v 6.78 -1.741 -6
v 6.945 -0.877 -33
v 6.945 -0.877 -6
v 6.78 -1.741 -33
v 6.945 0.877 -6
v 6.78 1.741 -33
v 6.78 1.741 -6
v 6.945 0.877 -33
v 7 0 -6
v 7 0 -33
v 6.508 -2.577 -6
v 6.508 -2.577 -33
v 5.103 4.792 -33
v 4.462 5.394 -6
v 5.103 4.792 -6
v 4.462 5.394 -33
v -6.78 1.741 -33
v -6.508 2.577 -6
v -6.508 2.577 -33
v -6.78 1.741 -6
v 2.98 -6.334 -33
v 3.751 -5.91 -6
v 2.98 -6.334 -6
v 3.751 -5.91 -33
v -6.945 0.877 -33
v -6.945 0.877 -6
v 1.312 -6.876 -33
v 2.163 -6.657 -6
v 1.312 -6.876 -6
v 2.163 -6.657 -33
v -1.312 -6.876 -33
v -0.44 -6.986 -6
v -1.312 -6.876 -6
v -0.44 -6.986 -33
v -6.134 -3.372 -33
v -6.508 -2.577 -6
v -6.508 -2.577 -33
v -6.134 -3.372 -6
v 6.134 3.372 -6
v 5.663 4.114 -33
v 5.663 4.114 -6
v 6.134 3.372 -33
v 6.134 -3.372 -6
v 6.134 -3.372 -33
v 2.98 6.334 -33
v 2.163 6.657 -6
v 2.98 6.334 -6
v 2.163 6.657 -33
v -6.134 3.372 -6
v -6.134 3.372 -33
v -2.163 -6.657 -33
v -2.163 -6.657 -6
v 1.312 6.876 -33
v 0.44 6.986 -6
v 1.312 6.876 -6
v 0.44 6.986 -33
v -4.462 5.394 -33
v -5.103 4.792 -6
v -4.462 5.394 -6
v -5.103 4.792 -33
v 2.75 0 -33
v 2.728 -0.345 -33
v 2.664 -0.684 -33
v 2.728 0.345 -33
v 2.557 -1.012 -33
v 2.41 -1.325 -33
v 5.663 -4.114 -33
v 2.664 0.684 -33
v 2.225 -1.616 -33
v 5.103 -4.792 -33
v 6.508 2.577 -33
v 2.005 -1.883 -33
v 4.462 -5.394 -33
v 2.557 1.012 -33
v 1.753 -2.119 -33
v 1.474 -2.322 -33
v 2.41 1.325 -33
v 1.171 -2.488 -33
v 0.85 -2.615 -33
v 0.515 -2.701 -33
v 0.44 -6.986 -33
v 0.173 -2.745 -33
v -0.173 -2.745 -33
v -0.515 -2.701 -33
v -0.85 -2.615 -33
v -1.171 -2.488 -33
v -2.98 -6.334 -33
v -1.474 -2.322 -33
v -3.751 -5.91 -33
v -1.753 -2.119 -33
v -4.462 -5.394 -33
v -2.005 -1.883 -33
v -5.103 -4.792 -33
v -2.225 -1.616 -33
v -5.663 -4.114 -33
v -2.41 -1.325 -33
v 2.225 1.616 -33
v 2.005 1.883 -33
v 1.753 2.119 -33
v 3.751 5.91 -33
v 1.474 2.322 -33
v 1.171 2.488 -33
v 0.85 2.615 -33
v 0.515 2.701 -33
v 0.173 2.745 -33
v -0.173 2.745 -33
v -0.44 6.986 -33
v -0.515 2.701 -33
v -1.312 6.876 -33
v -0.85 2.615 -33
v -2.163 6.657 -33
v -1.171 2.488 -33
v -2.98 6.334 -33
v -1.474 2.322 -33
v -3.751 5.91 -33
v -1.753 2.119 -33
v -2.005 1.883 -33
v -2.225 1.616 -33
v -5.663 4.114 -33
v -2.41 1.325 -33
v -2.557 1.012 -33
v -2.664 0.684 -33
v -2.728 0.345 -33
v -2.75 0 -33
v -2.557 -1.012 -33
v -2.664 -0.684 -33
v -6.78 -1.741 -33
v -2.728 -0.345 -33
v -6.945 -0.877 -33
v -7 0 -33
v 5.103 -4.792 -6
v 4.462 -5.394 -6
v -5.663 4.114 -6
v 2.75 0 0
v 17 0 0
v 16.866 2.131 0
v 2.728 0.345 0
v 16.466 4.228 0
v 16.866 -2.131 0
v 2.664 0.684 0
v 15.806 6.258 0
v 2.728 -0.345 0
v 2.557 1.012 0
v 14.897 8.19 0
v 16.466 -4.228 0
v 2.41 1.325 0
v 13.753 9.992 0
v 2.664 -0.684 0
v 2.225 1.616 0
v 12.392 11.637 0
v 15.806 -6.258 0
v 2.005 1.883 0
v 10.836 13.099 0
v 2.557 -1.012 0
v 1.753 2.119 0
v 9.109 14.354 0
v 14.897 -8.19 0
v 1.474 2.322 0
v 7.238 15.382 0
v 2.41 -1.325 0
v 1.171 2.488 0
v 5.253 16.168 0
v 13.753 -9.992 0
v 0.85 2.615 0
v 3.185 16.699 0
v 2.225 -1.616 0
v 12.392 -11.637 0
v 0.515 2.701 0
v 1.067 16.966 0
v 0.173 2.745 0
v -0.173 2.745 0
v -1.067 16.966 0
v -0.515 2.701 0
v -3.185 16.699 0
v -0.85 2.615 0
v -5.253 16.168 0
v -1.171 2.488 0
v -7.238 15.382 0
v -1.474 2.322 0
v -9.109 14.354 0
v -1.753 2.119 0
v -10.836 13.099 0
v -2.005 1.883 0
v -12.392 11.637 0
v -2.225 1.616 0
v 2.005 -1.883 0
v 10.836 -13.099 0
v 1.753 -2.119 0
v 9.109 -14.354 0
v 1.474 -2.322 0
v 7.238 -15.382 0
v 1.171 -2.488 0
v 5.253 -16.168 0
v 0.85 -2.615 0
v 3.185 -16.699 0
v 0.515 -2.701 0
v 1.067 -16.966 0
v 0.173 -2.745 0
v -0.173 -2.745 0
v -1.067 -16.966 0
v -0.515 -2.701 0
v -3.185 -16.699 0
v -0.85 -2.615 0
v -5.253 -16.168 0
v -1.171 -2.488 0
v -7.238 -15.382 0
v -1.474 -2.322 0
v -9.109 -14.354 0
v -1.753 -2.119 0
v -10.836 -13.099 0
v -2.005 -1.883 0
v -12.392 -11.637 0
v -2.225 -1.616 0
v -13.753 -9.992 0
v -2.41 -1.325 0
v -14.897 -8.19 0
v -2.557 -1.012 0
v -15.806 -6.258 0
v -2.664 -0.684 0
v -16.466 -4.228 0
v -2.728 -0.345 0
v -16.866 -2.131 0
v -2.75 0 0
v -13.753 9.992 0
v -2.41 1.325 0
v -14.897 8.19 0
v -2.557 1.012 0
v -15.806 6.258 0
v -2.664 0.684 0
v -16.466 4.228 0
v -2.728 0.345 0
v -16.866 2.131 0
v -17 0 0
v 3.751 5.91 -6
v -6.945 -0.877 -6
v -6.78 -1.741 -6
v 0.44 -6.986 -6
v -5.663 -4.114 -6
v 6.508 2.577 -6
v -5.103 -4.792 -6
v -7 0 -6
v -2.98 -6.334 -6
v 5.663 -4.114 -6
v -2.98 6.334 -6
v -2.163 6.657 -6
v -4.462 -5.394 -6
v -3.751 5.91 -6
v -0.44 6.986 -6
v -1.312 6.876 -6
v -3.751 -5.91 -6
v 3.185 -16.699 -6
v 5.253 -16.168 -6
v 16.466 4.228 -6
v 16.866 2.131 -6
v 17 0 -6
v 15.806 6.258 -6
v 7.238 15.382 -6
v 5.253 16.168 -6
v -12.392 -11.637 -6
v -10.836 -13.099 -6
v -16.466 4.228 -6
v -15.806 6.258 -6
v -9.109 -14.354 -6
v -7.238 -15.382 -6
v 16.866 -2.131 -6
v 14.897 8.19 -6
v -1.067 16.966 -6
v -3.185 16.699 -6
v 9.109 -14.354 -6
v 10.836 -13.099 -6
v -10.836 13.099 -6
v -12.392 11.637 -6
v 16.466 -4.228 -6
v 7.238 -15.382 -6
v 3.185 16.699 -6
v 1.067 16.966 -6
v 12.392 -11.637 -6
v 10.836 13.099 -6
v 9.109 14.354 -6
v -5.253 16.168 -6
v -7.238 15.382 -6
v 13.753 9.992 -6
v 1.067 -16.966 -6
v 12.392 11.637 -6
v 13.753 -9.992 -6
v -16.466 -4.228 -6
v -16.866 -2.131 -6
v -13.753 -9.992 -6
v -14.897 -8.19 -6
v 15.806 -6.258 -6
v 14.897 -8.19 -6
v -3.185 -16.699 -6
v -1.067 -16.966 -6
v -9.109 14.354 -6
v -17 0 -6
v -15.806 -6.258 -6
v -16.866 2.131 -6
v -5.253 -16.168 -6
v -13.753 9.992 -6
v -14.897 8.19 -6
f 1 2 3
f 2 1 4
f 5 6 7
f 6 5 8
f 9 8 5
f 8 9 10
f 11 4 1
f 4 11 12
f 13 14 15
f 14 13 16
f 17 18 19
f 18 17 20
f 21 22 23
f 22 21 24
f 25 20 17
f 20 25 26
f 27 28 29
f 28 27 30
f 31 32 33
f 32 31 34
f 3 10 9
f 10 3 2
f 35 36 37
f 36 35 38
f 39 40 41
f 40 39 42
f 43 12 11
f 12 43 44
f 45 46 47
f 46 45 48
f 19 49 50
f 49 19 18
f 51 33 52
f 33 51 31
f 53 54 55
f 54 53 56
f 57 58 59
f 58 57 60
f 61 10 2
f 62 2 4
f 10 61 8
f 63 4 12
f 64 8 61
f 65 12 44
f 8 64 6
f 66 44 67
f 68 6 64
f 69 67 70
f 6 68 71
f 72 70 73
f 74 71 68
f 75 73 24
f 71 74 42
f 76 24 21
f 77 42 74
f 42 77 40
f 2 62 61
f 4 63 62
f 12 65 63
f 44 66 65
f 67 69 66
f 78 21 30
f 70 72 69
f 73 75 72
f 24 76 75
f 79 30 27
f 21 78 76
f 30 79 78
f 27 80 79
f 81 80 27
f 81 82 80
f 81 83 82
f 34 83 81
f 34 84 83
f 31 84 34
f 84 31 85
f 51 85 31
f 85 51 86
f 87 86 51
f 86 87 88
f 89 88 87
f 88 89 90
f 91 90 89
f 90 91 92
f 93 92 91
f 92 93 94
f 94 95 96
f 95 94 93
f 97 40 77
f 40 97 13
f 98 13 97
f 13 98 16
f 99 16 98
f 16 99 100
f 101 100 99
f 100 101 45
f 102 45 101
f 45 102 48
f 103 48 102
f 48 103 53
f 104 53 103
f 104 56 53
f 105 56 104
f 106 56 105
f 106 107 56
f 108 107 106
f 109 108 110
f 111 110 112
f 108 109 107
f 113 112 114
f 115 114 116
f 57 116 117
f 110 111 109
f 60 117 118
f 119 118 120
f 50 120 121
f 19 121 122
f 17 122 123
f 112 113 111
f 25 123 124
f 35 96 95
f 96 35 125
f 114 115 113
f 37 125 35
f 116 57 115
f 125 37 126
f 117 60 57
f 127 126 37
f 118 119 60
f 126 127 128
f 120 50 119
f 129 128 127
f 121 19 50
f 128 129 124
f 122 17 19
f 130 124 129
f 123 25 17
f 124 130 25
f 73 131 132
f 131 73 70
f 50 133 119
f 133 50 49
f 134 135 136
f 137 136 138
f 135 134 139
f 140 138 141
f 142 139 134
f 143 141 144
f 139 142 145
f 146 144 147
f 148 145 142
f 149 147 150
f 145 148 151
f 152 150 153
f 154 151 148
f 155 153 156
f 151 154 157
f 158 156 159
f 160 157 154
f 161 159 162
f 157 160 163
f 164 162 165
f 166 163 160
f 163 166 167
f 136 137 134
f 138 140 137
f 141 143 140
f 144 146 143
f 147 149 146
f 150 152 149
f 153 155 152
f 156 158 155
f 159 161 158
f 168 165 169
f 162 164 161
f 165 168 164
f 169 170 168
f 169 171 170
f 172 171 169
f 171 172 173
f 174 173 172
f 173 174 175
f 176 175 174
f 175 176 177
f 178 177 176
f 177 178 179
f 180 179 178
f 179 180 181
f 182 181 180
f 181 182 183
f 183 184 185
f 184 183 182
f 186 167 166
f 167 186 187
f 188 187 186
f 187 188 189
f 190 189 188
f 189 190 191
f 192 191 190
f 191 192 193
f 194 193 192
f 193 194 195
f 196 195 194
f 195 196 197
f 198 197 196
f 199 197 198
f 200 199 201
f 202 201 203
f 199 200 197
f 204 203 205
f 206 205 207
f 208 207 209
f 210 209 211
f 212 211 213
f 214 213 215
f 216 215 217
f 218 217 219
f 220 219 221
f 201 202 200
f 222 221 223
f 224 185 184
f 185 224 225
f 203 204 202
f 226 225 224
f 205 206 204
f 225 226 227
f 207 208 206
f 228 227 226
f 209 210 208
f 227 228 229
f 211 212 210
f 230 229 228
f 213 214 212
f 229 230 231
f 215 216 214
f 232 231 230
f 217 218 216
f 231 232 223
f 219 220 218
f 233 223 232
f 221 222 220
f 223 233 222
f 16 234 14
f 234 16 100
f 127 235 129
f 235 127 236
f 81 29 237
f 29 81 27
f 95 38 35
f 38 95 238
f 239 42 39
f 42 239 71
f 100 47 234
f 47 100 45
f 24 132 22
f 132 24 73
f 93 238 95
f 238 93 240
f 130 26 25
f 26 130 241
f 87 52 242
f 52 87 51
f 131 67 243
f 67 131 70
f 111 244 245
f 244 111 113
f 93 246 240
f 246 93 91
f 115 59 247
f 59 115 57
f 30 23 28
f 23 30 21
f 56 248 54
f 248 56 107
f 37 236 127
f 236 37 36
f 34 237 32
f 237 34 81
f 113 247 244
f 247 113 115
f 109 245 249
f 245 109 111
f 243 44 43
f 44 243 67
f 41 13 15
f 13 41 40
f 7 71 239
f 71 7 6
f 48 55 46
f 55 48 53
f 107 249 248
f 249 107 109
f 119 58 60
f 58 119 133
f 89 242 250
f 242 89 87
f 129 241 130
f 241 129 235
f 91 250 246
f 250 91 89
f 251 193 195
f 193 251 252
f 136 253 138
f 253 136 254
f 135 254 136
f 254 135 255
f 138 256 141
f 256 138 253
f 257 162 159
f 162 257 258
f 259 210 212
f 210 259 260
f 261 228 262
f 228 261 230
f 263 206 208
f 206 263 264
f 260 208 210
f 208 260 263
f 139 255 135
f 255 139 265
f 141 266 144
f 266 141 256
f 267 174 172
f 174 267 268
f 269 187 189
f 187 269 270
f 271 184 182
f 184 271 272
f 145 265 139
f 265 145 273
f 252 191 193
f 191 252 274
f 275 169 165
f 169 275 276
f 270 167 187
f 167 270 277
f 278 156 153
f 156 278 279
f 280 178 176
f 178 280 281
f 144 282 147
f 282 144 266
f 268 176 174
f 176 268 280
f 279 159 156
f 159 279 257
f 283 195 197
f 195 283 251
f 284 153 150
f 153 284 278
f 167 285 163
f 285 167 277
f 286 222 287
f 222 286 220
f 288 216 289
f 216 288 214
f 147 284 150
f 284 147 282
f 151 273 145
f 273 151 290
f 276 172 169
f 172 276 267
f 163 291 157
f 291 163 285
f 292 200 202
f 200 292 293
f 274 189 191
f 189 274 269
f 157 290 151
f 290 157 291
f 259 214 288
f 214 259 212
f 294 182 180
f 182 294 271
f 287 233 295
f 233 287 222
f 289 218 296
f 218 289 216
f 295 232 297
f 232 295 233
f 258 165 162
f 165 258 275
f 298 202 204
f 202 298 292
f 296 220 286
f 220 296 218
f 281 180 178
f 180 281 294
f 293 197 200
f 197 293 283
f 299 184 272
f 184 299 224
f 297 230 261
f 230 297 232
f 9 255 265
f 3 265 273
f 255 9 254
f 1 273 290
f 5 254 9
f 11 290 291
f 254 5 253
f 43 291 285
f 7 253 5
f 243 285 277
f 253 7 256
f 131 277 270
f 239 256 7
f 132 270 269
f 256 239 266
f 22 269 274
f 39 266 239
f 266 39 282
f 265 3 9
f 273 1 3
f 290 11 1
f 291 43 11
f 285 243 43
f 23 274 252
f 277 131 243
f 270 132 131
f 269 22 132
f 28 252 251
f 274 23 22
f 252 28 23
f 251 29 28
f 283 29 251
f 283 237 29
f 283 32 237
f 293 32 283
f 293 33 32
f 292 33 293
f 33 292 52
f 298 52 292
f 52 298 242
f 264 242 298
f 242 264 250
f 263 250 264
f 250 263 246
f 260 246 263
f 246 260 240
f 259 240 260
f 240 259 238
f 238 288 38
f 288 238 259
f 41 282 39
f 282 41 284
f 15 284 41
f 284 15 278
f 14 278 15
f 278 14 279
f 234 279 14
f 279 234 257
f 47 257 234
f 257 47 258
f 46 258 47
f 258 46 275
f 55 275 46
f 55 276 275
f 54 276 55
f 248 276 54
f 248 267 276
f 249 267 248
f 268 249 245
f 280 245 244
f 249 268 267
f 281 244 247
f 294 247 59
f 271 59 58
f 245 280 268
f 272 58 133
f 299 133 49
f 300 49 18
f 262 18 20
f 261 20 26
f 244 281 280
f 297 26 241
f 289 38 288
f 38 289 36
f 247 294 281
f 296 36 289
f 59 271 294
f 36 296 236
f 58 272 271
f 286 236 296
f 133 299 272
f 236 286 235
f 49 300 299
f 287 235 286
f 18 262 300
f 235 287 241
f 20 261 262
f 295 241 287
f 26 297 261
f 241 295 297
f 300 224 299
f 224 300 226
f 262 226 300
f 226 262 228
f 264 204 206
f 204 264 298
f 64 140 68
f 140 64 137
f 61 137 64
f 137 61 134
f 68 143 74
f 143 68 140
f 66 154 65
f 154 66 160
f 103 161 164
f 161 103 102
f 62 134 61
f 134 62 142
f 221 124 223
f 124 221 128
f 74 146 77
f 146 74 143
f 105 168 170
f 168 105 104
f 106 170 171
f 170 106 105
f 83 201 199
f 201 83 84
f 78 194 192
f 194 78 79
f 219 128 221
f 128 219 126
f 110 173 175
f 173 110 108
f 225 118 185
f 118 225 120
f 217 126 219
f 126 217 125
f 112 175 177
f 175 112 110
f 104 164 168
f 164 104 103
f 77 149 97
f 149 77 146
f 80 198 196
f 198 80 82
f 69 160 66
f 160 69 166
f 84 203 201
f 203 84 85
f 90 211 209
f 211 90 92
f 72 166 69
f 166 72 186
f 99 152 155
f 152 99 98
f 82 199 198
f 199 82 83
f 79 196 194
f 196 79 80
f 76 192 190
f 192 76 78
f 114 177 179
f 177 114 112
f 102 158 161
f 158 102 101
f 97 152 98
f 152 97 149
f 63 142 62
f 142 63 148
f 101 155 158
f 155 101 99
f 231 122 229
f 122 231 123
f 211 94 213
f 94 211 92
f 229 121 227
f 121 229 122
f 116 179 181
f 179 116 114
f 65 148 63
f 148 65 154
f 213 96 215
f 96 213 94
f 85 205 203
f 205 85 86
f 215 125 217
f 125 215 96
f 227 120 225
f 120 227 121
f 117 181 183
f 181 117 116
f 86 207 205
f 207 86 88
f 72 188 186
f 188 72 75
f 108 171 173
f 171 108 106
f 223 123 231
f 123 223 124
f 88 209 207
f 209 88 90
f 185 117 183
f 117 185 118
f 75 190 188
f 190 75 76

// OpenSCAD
$fn = 50;


difference() {
	union() {
		translate(v = [0, 0, -33.0000000000]) {
			cylinder(h = 33, r = 7.0000000000);
		}
		translate(v = [0, 0, -6.0000000000]) {
			cylinder(h = 6, r = 17.0000000000);
		}
	}
	union() {
		#translate(v = [0, 0, -33]) {
			cylinder(h = 33, r = 2.7500000000);
		}
	}
}
